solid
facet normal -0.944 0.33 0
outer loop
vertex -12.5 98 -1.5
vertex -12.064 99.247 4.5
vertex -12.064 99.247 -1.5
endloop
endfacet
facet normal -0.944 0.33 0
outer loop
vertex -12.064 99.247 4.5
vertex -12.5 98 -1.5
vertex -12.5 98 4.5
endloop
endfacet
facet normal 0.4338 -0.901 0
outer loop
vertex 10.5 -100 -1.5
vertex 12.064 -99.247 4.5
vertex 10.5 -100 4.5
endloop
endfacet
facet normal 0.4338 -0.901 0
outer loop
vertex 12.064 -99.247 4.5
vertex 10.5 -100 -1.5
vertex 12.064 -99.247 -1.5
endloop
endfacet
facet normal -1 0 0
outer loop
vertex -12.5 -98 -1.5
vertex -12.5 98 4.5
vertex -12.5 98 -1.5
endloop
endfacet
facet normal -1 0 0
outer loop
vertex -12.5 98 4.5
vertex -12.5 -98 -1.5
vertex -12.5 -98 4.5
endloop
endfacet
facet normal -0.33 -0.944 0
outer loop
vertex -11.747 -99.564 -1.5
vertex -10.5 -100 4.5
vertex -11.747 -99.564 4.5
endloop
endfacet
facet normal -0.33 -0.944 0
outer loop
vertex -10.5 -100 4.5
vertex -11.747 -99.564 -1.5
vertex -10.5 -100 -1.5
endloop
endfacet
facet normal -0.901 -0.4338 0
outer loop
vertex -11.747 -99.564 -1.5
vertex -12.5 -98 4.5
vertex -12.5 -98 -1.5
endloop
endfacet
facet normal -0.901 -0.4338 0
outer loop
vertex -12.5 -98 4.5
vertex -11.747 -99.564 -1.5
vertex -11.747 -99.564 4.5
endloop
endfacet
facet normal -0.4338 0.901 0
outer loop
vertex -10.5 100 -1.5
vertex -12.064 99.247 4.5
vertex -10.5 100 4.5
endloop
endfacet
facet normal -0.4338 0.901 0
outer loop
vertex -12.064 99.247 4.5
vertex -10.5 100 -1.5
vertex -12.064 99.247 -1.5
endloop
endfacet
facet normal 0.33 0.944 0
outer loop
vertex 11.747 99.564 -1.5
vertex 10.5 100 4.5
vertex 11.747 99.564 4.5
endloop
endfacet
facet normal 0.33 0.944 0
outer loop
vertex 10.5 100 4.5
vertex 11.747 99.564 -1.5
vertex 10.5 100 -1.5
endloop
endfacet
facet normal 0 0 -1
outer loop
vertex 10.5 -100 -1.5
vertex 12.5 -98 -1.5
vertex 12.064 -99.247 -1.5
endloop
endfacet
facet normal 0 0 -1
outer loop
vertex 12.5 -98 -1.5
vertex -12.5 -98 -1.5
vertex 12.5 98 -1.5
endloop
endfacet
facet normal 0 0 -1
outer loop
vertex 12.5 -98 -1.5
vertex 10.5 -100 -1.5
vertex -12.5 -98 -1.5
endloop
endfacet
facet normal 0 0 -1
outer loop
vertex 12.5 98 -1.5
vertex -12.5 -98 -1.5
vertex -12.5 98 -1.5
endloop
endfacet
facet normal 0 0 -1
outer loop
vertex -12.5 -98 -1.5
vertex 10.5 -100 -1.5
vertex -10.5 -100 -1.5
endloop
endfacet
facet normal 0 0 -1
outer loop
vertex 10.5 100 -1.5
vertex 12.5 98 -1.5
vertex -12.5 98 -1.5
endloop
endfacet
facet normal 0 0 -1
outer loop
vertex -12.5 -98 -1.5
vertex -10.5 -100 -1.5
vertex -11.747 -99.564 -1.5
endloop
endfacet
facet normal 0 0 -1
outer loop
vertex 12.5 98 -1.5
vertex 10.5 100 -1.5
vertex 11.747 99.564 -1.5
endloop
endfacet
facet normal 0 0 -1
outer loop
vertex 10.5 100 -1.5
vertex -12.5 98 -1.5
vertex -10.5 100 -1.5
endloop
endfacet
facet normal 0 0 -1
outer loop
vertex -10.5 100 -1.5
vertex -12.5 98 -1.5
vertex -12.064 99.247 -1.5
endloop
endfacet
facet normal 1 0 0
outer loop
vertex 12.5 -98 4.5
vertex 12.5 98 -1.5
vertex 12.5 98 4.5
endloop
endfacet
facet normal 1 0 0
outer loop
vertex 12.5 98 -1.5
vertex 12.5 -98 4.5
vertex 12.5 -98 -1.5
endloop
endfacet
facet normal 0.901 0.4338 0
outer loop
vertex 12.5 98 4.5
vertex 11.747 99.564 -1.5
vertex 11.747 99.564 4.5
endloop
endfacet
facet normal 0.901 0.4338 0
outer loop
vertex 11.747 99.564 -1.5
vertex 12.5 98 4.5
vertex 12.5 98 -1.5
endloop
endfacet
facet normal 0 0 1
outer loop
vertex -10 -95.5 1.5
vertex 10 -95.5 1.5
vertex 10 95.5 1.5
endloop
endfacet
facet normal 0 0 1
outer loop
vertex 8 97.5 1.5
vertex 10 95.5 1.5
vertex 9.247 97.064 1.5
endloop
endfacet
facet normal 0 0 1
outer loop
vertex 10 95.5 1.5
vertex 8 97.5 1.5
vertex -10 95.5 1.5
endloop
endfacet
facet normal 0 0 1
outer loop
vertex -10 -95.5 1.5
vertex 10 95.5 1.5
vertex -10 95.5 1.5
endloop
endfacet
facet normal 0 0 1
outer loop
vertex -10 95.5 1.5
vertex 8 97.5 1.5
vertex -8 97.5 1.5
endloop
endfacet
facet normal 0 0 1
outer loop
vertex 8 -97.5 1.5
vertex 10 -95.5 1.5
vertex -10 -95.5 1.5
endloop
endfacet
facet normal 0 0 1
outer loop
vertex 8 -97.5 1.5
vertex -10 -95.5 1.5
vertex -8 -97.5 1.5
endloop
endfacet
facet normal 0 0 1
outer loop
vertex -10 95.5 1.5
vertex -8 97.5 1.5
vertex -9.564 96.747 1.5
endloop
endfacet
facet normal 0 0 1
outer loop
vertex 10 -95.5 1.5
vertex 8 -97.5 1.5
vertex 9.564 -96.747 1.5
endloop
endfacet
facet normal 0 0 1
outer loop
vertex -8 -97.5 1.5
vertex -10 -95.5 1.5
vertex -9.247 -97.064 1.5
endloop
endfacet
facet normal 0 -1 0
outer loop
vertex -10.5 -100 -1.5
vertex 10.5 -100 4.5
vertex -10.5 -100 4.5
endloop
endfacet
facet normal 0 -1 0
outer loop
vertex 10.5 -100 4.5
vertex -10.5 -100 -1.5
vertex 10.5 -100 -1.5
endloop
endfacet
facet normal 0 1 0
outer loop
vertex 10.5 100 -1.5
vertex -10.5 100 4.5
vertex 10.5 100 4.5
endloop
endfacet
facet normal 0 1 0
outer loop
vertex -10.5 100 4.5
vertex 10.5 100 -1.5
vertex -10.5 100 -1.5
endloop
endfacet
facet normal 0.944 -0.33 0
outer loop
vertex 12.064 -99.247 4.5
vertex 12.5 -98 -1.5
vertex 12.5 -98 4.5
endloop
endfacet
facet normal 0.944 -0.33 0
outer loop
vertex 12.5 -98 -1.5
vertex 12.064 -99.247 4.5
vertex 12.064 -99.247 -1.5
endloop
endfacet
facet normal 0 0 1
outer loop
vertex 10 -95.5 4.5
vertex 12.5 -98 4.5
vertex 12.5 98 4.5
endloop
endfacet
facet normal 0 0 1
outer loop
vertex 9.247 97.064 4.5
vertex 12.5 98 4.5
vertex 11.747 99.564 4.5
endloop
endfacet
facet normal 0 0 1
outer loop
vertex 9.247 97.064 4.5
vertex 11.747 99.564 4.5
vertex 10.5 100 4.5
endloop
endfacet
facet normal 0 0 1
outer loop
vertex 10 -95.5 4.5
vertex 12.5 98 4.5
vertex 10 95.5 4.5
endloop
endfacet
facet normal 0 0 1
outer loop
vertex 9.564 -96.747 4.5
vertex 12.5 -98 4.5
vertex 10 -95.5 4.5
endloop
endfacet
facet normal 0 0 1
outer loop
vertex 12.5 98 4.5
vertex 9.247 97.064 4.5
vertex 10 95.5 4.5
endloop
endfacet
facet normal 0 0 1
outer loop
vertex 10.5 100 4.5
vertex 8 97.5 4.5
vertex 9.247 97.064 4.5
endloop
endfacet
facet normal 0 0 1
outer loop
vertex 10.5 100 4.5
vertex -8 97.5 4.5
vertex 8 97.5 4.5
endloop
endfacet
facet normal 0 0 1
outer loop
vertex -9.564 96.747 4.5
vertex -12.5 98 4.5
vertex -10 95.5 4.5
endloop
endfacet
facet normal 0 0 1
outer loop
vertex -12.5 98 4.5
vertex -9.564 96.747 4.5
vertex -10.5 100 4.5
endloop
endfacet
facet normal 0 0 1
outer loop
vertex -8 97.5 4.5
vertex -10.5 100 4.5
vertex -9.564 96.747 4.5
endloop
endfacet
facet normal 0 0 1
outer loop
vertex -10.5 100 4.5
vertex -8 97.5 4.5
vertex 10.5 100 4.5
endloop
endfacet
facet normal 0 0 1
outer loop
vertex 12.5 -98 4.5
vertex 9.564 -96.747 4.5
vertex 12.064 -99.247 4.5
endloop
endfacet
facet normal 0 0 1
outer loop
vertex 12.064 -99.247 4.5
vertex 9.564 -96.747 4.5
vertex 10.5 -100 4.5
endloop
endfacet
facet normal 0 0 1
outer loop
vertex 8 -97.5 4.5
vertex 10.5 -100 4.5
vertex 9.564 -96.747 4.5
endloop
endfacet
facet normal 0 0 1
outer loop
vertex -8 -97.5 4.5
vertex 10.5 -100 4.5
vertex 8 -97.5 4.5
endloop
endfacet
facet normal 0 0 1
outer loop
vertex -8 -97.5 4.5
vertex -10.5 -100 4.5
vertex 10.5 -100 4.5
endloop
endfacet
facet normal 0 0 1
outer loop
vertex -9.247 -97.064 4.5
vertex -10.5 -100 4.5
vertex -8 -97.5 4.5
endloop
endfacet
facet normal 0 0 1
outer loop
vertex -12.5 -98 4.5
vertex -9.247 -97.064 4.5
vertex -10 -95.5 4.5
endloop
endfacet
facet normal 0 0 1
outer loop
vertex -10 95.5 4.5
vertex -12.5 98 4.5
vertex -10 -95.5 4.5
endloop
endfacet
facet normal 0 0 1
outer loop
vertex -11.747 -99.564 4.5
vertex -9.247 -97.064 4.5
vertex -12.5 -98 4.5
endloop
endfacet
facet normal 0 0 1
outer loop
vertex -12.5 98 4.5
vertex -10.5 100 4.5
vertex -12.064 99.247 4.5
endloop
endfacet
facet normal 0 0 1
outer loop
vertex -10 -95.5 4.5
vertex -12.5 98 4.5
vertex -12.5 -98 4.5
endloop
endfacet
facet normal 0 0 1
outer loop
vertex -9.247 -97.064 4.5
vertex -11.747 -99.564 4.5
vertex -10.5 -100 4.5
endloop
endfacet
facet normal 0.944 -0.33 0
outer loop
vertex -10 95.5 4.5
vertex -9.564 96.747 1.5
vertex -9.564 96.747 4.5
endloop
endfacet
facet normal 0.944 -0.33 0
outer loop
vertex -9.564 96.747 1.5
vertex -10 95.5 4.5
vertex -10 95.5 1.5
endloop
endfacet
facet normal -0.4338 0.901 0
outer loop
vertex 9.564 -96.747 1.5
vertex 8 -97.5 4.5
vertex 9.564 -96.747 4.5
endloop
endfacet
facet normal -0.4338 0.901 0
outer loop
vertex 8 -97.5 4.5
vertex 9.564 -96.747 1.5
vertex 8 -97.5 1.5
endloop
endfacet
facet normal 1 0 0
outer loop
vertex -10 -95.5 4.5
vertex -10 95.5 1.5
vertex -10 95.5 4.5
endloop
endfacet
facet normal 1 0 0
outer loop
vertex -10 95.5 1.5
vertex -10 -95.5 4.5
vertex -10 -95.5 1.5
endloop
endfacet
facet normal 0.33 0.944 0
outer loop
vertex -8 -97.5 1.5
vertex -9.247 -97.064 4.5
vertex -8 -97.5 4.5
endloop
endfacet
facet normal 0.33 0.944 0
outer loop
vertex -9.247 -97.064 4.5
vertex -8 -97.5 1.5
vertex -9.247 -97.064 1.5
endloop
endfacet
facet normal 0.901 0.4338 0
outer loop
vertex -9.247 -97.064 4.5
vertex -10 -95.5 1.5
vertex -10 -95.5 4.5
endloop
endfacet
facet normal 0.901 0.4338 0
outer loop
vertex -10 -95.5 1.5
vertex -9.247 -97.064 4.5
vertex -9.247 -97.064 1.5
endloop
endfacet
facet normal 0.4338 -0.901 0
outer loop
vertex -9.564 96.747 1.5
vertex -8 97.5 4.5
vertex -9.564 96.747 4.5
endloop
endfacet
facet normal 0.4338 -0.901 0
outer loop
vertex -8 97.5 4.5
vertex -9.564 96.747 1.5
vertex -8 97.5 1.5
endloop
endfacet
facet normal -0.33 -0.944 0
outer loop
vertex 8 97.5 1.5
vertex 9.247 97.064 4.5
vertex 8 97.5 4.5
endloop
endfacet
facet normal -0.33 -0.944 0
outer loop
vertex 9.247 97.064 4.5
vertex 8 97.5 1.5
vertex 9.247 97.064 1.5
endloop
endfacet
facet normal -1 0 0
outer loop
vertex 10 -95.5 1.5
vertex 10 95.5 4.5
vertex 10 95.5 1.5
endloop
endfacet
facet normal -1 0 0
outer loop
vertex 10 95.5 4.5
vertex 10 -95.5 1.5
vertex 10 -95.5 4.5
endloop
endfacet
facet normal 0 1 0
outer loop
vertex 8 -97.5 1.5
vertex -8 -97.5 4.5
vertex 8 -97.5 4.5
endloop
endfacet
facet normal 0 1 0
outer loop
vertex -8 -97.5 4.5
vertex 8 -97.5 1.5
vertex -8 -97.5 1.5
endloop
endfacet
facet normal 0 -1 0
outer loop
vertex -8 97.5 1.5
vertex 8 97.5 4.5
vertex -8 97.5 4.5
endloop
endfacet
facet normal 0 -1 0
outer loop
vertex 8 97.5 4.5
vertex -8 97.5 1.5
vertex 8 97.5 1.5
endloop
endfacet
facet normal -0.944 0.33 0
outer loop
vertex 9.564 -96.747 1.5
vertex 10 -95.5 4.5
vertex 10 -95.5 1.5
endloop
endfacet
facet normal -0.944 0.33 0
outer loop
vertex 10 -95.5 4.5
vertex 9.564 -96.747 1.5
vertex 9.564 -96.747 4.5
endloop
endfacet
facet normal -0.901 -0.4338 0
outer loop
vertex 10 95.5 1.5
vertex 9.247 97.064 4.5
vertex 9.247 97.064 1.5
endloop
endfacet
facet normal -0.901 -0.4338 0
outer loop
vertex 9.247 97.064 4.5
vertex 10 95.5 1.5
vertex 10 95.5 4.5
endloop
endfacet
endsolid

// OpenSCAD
/*
 * Tao Steps
 */
 echo(version=version());

logo = "steps.tao.2.png"; // res 3200x399, reduced to 200 x 221
logox = 3200; 
logoy = 399; 

module roundedRect(size, radius) {  
	linear_extrude(height=size.z, center=true) {
		offset(radius) offset(-radius) {
			square([size.x, size.y], center = true);
		}
	}
}


// Base plate
// ----------
plateWidth = 25;
plateLength = 200;
plateThickNess = 3;
cornerRadius = 2;
//color("green") {
difference() {  
	union() {
		difference() {
			roundedRect([plateWidth, plateLength, plateThickNess], cornerRadius);
			translate([0, 0, 2]) {
				scale([.9 * plateLength / logox, .9 * plateWidth / logoy, .02]) {
					color("white") {
						rotate([0, 0, -90]) {
							surface(file=logo, invert=true, center=true);
						}
					}
				}
        // the groove around the picture
        //difference() {
        //  roundedRect([plateWidth -  5, plateLength -  5, plateThickNess], cornerRadius);
        //  roundedRect([plateWidth - 10, plateLength - 10, plateThickNess * 1.1], cornerRadius);
        //}
			}
		}
		// The frame
		translate([0, 0, (plateThickNess / 1)]) {
			difference() {
				roundedRect([plateWidth, plateLength, plateThickNess], cornerRadius);
				roundedRect([plateWidth - 5, plateLength - 5, plateThickNess * 1.1], cornerRadius);
			}
		}
	}
}
//}
